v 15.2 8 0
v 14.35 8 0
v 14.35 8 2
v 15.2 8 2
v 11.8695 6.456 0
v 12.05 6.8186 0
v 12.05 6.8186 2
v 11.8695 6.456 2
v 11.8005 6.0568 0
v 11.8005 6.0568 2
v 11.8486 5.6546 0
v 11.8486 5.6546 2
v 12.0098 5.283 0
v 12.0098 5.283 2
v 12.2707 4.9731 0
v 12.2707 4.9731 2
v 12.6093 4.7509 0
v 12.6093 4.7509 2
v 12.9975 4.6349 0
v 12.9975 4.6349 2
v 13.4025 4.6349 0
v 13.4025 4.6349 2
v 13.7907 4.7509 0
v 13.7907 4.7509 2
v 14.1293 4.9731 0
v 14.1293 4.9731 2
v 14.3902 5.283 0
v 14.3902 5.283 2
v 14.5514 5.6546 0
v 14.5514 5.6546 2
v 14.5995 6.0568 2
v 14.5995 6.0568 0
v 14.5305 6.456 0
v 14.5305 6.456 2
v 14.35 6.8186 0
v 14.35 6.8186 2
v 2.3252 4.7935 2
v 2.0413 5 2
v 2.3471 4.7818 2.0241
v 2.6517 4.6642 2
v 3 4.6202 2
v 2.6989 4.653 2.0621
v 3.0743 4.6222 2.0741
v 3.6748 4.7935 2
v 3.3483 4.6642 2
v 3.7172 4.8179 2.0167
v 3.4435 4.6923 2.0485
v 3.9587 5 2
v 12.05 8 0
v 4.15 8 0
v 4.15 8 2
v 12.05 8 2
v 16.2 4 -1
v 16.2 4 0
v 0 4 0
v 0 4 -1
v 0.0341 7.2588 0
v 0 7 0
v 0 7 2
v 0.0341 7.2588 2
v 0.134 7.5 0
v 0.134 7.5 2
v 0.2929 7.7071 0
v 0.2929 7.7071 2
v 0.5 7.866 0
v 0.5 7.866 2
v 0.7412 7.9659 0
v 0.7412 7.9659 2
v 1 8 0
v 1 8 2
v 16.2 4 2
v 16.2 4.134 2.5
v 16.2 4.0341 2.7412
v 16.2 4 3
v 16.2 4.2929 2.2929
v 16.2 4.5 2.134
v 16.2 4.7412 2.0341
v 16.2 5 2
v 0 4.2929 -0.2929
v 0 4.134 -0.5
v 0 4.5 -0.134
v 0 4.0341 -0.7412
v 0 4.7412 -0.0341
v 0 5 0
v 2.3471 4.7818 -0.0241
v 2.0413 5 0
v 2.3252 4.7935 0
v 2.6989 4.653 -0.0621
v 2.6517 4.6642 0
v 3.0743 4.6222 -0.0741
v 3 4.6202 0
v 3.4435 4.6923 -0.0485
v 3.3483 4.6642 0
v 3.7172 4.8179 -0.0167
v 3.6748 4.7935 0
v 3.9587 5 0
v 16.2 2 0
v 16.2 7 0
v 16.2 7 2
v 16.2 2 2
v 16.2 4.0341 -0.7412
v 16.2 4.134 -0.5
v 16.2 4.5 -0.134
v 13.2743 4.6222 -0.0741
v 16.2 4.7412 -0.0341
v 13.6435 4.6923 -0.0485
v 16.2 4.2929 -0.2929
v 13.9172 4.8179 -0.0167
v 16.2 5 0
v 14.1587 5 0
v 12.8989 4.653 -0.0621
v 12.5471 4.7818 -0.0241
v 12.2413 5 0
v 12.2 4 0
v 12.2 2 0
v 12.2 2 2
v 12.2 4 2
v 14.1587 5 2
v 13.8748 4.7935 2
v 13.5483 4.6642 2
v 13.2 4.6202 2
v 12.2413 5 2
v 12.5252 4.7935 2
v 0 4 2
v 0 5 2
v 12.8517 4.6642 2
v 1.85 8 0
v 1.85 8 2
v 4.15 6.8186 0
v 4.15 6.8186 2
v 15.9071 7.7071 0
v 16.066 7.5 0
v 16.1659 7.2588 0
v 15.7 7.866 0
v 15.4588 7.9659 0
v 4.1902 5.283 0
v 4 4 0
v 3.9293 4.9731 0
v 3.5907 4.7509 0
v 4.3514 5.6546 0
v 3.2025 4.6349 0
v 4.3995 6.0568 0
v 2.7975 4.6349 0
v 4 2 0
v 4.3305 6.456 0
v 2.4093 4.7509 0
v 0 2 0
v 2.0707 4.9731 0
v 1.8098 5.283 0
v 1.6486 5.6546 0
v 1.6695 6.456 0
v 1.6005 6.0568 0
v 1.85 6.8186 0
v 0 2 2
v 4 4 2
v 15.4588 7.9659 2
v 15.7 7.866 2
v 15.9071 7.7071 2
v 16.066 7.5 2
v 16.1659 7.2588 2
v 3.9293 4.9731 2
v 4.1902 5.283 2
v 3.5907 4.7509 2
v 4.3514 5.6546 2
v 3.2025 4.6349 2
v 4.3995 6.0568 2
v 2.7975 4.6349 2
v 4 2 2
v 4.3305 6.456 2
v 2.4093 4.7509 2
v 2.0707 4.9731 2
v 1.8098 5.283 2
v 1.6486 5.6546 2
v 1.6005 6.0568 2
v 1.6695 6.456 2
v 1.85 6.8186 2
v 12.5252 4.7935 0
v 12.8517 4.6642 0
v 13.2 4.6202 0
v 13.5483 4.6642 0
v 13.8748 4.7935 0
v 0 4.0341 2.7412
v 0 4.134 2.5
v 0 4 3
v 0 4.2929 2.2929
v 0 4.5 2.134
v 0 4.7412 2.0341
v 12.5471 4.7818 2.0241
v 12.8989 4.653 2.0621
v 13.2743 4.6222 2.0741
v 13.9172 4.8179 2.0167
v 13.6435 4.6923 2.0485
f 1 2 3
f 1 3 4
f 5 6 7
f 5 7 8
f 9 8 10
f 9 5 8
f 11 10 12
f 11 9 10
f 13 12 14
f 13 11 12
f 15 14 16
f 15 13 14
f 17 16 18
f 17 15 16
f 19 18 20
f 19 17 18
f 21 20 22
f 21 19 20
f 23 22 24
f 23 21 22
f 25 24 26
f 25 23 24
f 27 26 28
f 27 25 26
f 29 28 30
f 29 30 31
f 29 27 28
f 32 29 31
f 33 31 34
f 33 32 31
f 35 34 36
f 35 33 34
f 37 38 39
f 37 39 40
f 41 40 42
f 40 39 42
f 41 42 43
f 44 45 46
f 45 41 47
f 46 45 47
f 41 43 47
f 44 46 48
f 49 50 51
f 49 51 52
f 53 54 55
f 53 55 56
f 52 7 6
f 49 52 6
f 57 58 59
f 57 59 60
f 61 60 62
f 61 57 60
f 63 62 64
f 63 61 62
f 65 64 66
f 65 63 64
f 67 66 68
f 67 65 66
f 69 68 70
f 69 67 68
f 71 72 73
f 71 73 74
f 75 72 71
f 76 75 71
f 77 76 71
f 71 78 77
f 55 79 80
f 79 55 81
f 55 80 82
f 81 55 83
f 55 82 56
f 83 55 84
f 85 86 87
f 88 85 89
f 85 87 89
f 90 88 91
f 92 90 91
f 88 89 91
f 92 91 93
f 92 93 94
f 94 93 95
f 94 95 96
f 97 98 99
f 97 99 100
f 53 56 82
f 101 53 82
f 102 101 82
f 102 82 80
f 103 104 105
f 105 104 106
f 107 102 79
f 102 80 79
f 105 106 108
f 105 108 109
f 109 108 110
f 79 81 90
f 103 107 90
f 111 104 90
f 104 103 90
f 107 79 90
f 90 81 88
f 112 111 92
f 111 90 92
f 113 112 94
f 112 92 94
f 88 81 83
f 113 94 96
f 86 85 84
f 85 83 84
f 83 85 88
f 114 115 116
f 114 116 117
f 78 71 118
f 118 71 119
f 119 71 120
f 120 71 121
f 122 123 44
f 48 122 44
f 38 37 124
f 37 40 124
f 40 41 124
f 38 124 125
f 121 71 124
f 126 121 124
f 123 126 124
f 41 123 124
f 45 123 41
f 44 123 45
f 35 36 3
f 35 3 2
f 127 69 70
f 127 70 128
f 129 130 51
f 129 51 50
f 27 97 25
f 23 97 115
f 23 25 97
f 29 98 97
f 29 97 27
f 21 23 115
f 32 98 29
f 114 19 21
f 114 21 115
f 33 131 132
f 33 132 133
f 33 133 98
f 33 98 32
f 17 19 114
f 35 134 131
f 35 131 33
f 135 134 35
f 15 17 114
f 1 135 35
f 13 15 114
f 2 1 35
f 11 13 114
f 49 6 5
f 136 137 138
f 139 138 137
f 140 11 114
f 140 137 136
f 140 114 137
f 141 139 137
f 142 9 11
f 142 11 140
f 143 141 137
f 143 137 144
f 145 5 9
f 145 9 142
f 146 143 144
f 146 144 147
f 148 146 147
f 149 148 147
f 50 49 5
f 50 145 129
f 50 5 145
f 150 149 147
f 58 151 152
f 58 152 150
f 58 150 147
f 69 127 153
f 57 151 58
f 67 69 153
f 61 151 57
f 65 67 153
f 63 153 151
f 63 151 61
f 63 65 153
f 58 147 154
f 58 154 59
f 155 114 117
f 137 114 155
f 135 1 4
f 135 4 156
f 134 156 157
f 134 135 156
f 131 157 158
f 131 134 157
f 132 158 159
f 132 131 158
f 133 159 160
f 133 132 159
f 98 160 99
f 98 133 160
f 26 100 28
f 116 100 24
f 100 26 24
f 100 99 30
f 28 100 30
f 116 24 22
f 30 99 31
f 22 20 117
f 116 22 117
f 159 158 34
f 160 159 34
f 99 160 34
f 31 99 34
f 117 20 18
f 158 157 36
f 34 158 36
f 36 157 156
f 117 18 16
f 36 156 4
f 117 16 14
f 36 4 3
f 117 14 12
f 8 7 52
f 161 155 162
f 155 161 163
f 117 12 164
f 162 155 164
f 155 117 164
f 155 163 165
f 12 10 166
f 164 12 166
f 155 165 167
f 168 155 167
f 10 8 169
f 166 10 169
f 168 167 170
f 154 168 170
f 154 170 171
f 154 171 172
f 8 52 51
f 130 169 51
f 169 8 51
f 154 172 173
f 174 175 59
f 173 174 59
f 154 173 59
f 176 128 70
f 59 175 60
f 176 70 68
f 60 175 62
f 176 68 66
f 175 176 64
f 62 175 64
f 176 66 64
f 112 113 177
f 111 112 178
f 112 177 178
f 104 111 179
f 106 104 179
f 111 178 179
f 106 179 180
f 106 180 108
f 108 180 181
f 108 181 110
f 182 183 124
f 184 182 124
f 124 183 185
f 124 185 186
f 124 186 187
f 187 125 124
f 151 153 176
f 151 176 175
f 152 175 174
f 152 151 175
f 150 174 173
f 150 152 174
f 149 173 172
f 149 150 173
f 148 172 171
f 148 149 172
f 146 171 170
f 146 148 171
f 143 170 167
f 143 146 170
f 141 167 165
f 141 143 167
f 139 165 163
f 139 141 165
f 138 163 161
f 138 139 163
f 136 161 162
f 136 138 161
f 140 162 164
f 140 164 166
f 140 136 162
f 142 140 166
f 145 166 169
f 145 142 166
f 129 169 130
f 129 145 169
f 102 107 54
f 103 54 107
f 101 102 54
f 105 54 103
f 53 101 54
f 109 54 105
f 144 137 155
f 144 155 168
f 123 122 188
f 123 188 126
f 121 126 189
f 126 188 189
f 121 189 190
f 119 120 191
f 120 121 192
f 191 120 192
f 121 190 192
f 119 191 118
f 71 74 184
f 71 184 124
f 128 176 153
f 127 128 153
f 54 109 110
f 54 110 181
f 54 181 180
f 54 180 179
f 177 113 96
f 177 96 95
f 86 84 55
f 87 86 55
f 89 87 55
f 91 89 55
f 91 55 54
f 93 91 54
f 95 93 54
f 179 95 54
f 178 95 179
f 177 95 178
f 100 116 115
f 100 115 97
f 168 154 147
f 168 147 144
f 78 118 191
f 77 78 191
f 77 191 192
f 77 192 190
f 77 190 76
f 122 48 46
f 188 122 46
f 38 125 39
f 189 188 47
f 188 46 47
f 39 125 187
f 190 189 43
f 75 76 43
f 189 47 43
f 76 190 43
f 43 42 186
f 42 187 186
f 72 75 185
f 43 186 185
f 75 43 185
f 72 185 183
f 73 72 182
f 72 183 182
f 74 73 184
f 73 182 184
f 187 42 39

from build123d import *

# Parameters (mm, degrees)
BOSS_EXTRUDE1_DEPTH     = 2
BOSS_EXTRUDE2_DEPTH     = 16.2
BOSS_EXTRUDE2_2_DEPTH   = 16.2
SKETCH3_W               = 4
SKETCH3_H               = 2
CUT_EXTRUDE1_DEPTH      = 4
CUT_EXTRUDE4_START      = -1.18136
SKETCH5_W               = 2.3
SKETCH5_H               = 2
CUT_EXTRUDE4_DEPTH      = 1.18136
SKETCH8_R               = 1.4
CUT_EXTRUDE6_DEPTH      = 3
CUT_EXTRUDE6_DEPTH_BACK = 3


with BuildPart() as part:
    # Sketch1 → Boss-Extrude1 (new body)
    with BuildSketch(Plane.XY):
        with BuildLine():
            Line((4, 8), (12.2, 8))
            Line((12.2, 8), (12.2, 7))
            ThreePointArc((12.2, 7), (13.2, 4.620204103), (14.2, 7))
            Line((14.2, 7), (14.2, 8))
            Line((14.2, 8), (15.2, 8))
            ThreePointArc((15.2, 8), (15.907106781, 7.707106781), (16.2, 7))
            Line((16.2, 7), (16.2, 0))
            Line((16.2, 0), (12.2, 0))
            Line((12.2, 0), (12.2, 4))
            Line((12.2, 4), (4, 4))
            Line((4, 4), (4, 0))
            Line((4, 0), (0, 0))
            Line((0, 0), (0, 7))
            ThreePointArc((0, 7), (0.292893219, 7.707106781), (1, 8))
            Line((1, 8), (2, 8))
            Line((2, 8), (2, 7))
            ThreePointArc((2, 7), (3, 4.620204103), (4, 7))
            Line((4, 7), (4, 8))
        make_face()
    extrude(amount=BOSS_EXTRUDE1_DEPTH)

    # Sketch3 → Cut-Extrude1 (cut, through all)
    with BuildSketch(Plane.XY.offset(2)):
        with Locations((2, 1)):
            Rectangle(SKETCH3_W, SKETCH3_H)
        with Locations((14.2, 1)):
            Rectangle(SKETCH3_W, SKETCH3_H)
    extrude(amount=-CUT_EXTRUDE1_DEPTH, mode=Mode.SUBTRACT)

    # Sketch5 → Cut-Extrude4 (cut)
    with BuildSketch(Plane(origin=(0, 8, 0), x_dir=(1, 0, 0), z_dir=(0, 1, 0)).offset(CUT_EXTRUDE4_START)):
        with Locations((3, -1)):
            Rectangle(SKETCH5_W, SKETCH5_H)
        with Locations((13.2, -1)):
            Rectangle(SKETCH5_W, SKETCH5_H)
    extrude(amount=CUT_EXTRUDE4_DEPTH, mode=Mode.SUBTRACT)


with BuildPart() as body_2:
    # Sketch2 → Boss-Extrude2 (new body)
    with BuildSketch(Plane.ZY):
        with BuildLine():
            Line((2, 4), (2, 5))
            ThreePointArc((2, 5), (2.292893219, 4.292893219), (3, 4))
            Line((3, 4), (2, 4))
        make_face()
    extrude(amount=-BOSS_EXTRUDE2_DEPTH)


with BuildPart() as body_3:
    # Sketch2 → Boss-Extrude2 2 (new body)
    with BuildSketch(Plane.ZY):
        with BuildLine():
            Line((0, 4), (-1, 4))
            ThreePointArc((-1, 4), (-0.292893219, 4.292893219), (0, 5))
            Line((0, 5), (0, 4))
        make_face()
    extrude(amount=-BOSS_EXTRUDE2_2_DEPTH)


with BuildPart() as cut_extrude6_tool:
    # Sketch8 → Cut-Extrude6 (new body, two sides)
    with BuildSketch(Plane.XY.offset(1)) as cut_extrude6_sk:
        with Locations((3, 6.020204103)):
            Circle(SKETCH8_R)
        with Locations((13.2, 6.020204103)):
            Circle(SKETCH8_R)
    extrude(amount=CUT_EXTRUDE6_DEPTH)
    extrude(cut_extrude6_sk.sketch, amount=-CUT_EXTRUDE6_DEPTH_BACK)


with BuildPart() as body_2_1:
    add(body_2.part)

    # Cut-Extrude6: cut by cut_extrude6_tool
    add(cut_extrude6_tool.part, mode=Mode.SUBTRACT)


with BuildPart() as body_3_1:
    add(body_3.part)

    # Cut-Extrude6: cut by cut_extrude6_tool
    add(cut_extrude6_tool.part, mode=Mode.SUBTRACT)


solid = Compound([part.part, body_2_1.part, body_3_1.part])
